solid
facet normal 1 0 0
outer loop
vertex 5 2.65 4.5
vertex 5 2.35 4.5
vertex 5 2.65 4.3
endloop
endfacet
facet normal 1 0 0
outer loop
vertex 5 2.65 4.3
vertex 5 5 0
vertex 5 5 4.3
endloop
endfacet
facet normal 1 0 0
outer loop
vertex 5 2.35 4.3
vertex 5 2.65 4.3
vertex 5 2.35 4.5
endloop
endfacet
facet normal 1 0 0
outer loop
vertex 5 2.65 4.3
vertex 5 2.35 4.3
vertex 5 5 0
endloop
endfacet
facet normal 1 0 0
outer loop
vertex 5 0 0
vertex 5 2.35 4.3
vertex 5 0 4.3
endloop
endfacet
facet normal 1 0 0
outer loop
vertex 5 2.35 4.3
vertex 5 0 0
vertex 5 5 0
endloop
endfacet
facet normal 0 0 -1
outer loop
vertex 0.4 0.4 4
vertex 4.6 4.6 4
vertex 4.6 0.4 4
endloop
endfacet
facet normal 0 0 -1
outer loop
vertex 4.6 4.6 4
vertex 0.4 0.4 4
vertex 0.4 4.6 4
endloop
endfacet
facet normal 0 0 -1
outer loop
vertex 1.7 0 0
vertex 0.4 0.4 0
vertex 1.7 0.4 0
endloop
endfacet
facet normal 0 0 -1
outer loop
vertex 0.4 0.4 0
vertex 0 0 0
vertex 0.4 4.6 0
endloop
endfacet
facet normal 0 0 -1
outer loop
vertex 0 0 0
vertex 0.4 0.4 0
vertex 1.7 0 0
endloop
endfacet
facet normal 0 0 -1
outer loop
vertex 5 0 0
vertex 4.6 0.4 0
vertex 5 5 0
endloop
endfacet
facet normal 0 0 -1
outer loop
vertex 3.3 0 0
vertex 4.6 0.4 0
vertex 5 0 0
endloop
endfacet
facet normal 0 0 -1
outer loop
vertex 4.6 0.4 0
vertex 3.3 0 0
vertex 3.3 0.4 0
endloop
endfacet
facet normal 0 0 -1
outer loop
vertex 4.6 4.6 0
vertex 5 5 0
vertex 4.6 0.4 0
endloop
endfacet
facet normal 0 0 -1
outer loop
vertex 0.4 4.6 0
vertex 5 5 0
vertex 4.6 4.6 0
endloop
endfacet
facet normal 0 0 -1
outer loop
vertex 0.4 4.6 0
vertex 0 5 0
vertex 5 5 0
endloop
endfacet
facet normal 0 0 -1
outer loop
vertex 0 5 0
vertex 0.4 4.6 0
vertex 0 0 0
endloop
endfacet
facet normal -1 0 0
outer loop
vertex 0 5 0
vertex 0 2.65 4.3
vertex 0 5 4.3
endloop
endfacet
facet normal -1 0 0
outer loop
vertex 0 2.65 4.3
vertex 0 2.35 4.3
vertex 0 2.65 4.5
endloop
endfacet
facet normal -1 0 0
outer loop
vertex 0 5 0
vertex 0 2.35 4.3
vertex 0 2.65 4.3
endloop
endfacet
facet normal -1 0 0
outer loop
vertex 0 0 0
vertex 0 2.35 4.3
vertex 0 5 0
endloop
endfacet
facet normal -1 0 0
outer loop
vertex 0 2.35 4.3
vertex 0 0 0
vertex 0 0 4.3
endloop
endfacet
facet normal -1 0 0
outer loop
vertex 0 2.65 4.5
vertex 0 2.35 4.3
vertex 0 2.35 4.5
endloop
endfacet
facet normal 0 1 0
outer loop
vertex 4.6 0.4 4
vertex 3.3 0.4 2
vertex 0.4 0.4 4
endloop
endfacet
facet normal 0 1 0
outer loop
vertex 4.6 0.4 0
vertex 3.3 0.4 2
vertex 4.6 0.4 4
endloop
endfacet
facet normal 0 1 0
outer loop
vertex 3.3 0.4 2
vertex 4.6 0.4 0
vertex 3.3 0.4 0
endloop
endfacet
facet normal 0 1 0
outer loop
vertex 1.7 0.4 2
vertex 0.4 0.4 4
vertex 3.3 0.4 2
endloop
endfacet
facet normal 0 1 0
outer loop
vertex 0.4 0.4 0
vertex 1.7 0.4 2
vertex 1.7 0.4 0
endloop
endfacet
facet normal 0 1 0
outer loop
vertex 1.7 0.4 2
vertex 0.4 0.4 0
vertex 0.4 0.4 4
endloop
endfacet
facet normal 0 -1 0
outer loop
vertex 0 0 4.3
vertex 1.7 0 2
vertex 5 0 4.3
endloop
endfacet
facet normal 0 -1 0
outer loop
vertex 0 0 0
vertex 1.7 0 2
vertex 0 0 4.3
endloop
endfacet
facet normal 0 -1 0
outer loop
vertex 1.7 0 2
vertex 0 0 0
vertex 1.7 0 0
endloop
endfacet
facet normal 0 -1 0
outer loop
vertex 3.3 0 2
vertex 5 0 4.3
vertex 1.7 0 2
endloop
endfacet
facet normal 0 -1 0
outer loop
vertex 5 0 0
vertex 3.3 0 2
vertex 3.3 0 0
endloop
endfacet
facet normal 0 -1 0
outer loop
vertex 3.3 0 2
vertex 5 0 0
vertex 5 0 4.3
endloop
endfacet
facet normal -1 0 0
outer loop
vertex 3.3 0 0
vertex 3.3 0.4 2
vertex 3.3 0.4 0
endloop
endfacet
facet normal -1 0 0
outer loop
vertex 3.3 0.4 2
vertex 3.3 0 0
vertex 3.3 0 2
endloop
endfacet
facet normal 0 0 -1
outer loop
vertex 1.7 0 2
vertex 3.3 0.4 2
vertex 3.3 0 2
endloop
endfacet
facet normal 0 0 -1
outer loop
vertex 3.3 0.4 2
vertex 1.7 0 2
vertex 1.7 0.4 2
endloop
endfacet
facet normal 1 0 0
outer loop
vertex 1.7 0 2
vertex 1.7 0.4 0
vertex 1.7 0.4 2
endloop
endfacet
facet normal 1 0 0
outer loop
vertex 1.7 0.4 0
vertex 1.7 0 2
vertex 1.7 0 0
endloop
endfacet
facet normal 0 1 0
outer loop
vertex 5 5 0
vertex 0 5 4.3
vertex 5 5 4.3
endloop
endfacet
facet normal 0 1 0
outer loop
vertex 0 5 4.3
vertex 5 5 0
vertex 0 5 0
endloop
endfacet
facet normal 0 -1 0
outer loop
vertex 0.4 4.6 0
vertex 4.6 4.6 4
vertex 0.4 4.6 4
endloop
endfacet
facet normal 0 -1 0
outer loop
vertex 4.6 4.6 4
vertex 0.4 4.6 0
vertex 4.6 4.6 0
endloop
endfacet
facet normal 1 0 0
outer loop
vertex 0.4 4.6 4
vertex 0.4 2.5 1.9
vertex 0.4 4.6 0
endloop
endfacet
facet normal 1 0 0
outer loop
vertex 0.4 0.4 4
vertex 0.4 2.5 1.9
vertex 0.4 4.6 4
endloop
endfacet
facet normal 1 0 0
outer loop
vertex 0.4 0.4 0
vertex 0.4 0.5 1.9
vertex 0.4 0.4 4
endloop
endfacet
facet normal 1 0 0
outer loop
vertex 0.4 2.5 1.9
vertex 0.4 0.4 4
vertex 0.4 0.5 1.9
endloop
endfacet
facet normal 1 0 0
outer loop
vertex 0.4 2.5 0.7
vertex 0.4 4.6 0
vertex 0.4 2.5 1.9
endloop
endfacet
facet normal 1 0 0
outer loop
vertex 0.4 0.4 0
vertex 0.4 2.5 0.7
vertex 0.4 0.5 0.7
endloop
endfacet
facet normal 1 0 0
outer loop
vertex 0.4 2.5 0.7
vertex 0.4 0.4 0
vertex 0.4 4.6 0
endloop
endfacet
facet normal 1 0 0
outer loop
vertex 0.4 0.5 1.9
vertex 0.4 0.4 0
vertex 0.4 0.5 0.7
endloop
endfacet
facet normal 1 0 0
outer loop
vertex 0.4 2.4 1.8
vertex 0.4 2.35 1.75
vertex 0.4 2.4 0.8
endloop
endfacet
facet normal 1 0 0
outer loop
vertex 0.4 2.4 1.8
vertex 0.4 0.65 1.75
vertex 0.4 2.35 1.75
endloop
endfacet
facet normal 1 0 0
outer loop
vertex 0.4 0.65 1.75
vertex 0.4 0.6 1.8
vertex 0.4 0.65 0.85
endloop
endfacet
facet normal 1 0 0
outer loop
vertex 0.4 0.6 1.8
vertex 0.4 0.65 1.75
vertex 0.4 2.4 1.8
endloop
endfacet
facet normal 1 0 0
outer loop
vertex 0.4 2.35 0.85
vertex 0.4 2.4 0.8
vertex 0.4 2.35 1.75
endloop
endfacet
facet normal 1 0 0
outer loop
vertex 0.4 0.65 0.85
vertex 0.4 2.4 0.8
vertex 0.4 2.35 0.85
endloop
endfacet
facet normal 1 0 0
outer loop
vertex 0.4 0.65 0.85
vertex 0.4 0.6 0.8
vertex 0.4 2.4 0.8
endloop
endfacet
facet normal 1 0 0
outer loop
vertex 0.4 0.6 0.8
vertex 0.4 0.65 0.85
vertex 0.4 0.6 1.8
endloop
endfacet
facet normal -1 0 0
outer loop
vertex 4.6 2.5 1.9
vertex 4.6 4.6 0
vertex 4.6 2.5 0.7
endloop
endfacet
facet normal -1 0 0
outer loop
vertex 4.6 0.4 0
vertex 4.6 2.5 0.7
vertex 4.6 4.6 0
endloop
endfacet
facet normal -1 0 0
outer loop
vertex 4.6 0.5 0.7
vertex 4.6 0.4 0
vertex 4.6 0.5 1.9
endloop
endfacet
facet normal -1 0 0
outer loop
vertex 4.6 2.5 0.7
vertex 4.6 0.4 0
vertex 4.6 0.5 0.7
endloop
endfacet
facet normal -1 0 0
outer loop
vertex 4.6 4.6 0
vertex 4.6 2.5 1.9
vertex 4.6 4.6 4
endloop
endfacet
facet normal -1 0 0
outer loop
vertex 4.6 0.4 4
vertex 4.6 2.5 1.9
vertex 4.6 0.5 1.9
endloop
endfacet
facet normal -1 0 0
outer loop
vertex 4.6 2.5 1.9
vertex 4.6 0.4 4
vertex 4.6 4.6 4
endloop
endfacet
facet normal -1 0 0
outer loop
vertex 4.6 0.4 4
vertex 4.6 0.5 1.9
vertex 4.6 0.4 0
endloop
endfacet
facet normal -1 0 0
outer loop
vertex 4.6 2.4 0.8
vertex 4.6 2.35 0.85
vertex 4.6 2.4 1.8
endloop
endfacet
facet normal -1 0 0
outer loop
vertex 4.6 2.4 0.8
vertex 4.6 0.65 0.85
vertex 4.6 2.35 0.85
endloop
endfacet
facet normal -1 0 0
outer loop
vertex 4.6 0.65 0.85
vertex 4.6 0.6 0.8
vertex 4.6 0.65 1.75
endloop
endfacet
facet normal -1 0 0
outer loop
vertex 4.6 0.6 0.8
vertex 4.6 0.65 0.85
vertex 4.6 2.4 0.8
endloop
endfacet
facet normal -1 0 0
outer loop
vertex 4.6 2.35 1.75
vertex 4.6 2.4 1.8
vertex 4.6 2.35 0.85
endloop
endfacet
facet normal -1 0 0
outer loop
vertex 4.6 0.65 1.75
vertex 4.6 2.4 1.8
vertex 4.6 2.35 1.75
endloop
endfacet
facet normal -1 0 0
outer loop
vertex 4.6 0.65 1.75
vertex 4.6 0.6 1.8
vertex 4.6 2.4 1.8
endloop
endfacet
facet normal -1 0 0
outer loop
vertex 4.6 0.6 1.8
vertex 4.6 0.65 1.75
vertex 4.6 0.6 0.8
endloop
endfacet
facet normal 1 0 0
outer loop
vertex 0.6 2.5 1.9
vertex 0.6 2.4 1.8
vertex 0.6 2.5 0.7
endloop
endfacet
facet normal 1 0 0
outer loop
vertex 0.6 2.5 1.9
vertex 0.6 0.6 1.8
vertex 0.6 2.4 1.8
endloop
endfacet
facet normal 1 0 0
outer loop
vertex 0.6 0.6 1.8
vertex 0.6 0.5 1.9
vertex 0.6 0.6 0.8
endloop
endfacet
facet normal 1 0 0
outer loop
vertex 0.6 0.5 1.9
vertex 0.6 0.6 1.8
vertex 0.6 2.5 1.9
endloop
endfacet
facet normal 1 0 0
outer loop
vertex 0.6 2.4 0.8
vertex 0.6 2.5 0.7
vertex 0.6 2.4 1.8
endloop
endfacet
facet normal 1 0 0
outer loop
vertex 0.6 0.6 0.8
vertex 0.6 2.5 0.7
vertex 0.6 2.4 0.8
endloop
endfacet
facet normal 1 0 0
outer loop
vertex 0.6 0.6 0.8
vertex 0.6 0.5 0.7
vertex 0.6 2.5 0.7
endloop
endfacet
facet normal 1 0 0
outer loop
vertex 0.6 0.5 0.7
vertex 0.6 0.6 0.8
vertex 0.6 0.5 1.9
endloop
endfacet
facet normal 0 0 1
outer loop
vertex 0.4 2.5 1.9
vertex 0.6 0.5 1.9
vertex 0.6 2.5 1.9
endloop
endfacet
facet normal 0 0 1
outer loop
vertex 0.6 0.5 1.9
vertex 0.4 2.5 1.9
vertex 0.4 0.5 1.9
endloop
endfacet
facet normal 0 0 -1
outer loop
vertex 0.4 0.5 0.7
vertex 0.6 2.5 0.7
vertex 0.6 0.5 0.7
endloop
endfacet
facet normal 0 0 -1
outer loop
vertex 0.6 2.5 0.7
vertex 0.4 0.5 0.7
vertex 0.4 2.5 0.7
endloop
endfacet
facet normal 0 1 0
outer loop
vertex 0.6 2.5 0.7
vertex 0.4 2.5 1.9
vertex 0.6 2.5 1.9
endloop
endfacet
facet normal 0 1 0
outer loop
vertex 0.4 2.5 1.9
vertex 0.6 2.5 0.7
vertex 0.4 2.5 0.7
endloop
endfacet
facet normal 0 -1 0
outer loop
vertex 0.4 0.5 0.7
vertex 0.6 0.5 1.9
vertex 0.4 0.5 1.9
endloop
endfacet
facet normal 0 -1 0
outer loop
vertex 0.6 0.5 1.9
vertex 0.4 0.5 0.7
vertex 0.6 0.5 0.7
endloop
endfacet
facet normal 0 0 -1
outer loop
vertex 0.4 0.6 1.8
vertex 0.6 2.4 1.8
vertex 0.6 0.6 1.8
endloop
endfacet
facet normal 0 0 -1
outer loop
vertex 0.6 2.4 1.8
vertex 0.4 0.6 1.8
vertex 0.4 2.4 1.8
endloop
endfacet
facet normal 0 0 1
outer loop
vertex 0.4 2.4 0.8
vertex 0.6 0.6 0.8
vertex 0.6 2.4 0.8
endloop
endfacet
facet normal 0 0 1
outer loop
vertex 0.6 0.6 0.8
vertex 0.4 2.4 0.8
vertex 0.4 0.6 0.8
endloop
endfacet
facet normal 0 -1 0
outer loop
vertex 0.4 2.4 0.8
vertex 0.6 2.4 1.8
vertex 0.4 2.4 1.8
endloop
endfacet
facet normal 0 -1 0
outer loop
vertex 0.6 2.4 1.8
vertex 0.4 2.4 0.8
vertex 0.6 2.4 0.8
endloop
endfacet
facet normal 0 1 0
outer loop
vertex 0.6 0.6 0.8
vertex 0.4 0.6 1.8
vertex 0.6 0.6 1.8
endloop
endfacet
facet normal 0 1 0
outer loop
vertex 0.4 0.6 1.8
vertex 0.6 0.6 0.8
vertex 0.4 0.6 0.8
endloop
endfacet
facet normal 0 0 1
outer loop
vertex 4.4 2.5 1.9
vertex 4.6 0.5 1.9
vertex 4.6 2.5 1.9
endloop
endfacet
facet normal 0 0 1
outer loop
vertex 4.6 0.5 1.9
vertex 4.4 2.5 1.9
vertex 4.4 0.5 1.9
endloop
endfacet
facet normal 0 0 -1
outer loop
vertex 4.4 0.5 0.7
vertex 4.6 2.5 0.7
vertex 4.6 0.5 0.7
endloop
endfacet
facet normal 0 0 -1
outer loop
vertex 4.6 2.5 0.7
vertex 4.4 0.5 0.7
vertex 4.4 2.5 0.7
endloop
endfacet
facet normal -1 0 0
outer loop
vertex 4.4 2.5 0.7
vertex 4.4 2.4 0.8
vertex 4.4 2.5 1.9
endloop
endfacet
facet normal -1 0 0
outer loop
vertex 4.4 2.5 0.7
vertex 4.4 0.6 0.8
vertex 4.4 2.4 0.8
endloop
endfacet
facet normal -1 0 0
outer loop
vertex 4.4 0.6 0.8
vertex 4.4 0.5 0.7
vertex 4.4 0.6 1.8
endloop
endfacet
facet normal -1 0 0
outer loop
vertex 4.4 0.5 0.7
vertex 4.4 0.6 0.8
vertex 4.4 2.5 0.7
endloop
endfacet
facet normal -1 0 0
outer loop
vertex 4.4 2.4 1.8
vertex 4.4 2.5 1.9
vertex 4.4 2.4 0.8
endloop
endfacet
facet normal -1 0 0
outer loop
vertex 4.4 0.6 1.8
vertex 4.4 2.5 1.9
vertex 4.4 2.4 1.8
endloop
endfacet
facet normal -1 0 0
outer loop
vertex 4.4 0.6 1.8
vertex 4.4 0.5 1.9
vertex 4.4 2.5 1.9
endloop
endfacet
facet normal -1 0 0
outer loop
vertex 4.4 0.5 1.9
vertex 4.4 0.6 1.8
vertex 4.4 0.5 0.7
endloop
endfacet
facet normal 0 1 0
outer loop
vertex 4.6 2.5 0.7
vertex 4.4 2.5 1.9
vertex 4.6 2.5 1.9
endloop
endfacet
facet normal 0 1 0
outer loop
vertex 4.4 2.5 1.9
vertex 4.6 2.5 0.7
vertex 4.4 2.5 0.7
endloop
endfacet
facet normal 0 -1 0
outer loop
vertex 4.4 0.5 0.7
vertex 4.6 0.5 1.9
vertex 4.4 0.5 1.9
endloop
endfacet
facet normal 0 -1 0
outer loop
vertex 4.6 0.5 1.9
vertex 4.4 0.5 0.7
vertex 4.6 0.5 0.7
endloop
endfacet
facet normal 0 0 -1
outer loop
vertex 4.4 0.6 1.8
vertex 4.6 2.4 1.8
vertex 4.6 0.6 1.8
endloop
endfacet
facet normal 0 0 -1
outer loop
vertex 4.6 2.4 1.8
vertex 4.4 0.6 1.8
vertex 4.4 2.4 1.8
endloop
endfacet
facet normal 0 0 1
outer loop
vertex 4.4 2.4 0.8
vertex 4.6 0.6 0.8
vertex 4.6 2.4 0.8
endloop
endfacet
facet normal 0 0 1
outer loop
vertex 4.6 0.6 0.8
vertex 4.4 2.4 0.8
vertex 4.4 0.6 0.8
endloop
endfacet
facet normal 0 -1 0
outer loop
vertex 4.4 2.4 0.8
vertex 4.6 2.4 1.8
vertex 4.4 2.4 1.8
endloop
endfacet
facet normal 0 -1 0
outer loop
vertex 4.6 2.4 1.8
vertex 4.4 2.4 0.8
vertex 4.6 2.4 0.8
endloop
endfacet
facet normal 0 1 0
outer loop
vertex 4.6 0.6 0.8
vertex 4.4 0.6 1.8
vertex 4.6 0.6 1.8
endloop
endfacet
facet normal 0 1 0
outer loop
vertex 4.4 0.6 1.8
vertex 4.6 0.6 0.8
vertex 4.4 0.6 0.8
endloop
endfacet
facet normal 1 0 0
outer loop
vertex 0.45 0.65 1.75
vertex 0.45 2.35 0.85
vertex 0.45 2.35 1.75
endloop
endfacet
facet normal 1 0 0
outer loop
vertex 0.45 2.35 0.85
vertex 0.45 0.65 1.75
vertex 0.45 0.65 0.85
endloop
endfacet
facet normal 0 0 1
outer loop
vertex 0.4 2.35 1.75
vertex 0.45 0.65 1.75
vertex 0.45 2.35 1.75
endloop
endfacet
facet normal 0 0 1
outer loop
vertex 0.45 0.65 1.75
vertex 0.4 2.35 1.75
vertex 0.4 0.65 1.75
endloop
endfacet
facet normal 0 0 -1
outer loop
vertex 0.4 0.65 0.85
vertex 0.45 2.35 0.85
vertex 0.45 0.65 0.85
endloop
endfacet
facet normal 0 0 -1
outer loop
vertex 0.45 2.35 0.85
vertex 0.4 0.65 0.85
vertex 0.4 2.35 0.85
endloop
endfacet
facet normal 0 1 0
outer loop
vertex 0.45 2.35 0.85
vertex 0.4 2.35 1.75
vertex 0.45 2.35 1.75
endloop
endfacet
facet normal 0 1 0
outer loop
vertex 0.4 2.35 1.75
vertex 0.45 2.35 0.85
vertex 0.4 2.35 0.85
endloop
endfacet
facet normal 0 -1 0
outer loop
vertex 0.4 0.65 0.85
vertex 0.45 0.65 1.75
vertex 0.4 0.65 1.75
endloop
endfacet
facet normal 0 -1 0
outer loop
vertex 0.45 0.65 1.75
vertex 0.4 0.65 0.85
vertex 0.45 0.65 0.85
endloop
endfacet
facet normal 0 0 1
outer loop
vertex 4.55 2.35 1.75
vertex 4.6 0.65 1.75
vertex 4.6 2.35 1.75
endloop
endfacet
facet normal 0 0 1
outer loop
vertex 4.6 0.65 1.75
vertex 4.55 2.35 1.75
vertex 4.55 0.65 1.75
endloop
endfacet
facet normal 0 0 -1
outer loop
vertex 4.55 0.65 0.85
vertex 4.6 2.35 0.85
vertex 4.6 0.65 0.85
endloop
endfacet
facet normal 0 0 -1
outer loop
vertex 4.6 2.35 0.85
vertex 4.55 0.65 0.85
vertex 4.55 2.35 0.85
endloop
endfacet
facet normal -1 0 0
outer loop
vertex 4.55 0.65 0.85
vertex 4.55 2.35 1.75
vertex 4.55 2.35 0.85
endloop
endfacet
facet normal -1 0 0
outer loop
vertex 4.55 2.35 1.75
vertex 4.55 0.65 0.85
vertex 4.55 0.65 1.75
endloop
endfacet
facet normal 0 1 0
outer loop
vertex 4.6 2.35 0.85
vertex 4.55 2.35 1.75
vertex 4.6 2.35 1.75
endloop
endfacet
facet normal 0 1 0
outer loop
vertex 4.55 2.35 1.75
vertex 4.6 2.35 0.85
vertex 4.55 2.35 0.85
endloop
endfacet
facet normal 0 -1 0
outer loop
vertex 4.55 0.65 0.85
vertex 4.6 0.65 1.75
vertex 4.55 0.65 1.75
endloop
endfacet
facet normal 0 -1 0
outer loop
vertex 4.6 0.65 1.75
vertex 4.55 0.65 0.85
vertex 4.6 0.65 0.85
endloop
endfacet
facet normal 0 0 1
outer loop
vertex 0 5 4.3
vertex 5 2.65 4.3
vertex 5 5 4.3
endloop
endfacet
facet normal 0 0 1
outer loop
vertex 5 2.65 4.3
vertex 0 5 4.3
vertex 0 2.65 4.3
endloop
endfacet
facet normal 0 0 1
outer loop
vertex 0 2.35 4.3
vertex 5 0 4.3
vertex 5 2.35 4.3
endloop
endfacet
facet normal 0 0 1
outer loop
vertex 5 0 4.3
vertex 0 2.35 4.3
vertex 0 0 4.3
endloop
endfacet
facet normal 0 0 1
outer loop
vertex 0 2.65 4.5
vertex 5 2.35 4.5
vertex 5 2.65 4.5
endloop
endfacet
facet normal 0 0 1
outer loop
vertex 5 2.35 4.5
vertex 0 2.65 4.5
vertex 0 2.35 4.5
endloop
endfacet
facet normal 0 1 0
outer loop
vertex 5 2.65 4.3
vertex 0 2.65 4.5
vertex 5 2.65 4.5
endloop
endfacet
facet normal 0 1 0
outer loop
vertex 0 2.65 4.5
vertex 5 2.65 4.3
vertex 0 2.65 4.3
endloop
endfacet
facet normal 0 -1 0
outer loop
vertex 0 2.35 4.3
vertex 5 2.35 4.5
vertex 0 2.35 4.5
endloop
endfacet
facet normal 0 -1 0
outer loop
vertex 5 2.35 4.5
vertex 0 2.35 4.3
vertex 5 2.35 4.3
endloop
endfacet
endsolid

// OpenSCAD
// 岗亭 (battle_guardhouse) — 小区门岗/检查站
// 轴: x=宽(5), y=深(5), z=高(4.5); 原点在角(0,0,0); 门在 y=0 面(后向, 与 CONFIGS 门洞对齐)
// 四面 0.4m 墙 + 后向门洞 1.6×2 + 左右窗(玻璃) + 平顶+屋脊(人字顶低模近似)
// 碰撞契约: 墙 0.4 + 门洞 x[1.7,3.3] z[0,2] + 顶 4-4.5 → GLB bbox 必须精确 5×5×4.5
$fn = 6;

module walls() {
  wall_h = 4;
  // 前墙 (y=5 面, 厚 0.4)
  color([0.70, 0.66, 0.58]) translate([0, 4.6, 0]) cube([5, 0.4, wall_h]);
  // 左右墙 (厚 0.4)
  color([0.70, 0.66, 0.58]) translate([0, 0, 0]) cube([0.4, 5, wall_h]);
  color([0.70, 0.66, 0.58]) translate([4.6, 0, 0]) cube([0.4, 5, wall_h]);
  // 后墙 (y=0 面, 厚 0.4) 挖门洞 x[1.7,3.3] z[0,2]
  difference() {
    color([0.70, 0.66, 0.58]) translate([0, 0, 0]) cube([5, 0.4, wall_h]);
    translate([1.7, -0.1, 0]) cube([1.6, 0.6, 2]);
  }
}

module windows() {
  // 左右墙窗 (y 0.5-2.5, z 0.7-1.9) + 窗玻璃
  for (x = [0.4, 4.6]) {
    difference() {
      color([0.70, 0.66, 0.58]) translate([x, 1.5, 1.3]) cube([0.4, 2.0, 1.2], center = true);
      translate([x, 1.5, 1.3]) cube([0.5, 1.8, 1.0], center = true);
    }
    // 窗玻璃 (薄板, 内侧暗色)
    color([0.30, 0.34, 0.40]) translate([x, 1.5, 1.3]) cube([0.1, 1.7, 0.9], center = true);
  }
}

module roof() {
  // 平顶 (5×5×0.3, z 4-4.3) + 屋脊 (z 4.1-4.5, 人字顶低模)
  color([0.55, 0.40, 0.34]) translate([0, 0, 4]) cube([5, 5, 0.3]);
  color([0.48, 0.35, 0.30]) translate([0, 2.35, 4.1]) cube([5, 0.3, 0.4]);
}

walls();
windows();
roof();
